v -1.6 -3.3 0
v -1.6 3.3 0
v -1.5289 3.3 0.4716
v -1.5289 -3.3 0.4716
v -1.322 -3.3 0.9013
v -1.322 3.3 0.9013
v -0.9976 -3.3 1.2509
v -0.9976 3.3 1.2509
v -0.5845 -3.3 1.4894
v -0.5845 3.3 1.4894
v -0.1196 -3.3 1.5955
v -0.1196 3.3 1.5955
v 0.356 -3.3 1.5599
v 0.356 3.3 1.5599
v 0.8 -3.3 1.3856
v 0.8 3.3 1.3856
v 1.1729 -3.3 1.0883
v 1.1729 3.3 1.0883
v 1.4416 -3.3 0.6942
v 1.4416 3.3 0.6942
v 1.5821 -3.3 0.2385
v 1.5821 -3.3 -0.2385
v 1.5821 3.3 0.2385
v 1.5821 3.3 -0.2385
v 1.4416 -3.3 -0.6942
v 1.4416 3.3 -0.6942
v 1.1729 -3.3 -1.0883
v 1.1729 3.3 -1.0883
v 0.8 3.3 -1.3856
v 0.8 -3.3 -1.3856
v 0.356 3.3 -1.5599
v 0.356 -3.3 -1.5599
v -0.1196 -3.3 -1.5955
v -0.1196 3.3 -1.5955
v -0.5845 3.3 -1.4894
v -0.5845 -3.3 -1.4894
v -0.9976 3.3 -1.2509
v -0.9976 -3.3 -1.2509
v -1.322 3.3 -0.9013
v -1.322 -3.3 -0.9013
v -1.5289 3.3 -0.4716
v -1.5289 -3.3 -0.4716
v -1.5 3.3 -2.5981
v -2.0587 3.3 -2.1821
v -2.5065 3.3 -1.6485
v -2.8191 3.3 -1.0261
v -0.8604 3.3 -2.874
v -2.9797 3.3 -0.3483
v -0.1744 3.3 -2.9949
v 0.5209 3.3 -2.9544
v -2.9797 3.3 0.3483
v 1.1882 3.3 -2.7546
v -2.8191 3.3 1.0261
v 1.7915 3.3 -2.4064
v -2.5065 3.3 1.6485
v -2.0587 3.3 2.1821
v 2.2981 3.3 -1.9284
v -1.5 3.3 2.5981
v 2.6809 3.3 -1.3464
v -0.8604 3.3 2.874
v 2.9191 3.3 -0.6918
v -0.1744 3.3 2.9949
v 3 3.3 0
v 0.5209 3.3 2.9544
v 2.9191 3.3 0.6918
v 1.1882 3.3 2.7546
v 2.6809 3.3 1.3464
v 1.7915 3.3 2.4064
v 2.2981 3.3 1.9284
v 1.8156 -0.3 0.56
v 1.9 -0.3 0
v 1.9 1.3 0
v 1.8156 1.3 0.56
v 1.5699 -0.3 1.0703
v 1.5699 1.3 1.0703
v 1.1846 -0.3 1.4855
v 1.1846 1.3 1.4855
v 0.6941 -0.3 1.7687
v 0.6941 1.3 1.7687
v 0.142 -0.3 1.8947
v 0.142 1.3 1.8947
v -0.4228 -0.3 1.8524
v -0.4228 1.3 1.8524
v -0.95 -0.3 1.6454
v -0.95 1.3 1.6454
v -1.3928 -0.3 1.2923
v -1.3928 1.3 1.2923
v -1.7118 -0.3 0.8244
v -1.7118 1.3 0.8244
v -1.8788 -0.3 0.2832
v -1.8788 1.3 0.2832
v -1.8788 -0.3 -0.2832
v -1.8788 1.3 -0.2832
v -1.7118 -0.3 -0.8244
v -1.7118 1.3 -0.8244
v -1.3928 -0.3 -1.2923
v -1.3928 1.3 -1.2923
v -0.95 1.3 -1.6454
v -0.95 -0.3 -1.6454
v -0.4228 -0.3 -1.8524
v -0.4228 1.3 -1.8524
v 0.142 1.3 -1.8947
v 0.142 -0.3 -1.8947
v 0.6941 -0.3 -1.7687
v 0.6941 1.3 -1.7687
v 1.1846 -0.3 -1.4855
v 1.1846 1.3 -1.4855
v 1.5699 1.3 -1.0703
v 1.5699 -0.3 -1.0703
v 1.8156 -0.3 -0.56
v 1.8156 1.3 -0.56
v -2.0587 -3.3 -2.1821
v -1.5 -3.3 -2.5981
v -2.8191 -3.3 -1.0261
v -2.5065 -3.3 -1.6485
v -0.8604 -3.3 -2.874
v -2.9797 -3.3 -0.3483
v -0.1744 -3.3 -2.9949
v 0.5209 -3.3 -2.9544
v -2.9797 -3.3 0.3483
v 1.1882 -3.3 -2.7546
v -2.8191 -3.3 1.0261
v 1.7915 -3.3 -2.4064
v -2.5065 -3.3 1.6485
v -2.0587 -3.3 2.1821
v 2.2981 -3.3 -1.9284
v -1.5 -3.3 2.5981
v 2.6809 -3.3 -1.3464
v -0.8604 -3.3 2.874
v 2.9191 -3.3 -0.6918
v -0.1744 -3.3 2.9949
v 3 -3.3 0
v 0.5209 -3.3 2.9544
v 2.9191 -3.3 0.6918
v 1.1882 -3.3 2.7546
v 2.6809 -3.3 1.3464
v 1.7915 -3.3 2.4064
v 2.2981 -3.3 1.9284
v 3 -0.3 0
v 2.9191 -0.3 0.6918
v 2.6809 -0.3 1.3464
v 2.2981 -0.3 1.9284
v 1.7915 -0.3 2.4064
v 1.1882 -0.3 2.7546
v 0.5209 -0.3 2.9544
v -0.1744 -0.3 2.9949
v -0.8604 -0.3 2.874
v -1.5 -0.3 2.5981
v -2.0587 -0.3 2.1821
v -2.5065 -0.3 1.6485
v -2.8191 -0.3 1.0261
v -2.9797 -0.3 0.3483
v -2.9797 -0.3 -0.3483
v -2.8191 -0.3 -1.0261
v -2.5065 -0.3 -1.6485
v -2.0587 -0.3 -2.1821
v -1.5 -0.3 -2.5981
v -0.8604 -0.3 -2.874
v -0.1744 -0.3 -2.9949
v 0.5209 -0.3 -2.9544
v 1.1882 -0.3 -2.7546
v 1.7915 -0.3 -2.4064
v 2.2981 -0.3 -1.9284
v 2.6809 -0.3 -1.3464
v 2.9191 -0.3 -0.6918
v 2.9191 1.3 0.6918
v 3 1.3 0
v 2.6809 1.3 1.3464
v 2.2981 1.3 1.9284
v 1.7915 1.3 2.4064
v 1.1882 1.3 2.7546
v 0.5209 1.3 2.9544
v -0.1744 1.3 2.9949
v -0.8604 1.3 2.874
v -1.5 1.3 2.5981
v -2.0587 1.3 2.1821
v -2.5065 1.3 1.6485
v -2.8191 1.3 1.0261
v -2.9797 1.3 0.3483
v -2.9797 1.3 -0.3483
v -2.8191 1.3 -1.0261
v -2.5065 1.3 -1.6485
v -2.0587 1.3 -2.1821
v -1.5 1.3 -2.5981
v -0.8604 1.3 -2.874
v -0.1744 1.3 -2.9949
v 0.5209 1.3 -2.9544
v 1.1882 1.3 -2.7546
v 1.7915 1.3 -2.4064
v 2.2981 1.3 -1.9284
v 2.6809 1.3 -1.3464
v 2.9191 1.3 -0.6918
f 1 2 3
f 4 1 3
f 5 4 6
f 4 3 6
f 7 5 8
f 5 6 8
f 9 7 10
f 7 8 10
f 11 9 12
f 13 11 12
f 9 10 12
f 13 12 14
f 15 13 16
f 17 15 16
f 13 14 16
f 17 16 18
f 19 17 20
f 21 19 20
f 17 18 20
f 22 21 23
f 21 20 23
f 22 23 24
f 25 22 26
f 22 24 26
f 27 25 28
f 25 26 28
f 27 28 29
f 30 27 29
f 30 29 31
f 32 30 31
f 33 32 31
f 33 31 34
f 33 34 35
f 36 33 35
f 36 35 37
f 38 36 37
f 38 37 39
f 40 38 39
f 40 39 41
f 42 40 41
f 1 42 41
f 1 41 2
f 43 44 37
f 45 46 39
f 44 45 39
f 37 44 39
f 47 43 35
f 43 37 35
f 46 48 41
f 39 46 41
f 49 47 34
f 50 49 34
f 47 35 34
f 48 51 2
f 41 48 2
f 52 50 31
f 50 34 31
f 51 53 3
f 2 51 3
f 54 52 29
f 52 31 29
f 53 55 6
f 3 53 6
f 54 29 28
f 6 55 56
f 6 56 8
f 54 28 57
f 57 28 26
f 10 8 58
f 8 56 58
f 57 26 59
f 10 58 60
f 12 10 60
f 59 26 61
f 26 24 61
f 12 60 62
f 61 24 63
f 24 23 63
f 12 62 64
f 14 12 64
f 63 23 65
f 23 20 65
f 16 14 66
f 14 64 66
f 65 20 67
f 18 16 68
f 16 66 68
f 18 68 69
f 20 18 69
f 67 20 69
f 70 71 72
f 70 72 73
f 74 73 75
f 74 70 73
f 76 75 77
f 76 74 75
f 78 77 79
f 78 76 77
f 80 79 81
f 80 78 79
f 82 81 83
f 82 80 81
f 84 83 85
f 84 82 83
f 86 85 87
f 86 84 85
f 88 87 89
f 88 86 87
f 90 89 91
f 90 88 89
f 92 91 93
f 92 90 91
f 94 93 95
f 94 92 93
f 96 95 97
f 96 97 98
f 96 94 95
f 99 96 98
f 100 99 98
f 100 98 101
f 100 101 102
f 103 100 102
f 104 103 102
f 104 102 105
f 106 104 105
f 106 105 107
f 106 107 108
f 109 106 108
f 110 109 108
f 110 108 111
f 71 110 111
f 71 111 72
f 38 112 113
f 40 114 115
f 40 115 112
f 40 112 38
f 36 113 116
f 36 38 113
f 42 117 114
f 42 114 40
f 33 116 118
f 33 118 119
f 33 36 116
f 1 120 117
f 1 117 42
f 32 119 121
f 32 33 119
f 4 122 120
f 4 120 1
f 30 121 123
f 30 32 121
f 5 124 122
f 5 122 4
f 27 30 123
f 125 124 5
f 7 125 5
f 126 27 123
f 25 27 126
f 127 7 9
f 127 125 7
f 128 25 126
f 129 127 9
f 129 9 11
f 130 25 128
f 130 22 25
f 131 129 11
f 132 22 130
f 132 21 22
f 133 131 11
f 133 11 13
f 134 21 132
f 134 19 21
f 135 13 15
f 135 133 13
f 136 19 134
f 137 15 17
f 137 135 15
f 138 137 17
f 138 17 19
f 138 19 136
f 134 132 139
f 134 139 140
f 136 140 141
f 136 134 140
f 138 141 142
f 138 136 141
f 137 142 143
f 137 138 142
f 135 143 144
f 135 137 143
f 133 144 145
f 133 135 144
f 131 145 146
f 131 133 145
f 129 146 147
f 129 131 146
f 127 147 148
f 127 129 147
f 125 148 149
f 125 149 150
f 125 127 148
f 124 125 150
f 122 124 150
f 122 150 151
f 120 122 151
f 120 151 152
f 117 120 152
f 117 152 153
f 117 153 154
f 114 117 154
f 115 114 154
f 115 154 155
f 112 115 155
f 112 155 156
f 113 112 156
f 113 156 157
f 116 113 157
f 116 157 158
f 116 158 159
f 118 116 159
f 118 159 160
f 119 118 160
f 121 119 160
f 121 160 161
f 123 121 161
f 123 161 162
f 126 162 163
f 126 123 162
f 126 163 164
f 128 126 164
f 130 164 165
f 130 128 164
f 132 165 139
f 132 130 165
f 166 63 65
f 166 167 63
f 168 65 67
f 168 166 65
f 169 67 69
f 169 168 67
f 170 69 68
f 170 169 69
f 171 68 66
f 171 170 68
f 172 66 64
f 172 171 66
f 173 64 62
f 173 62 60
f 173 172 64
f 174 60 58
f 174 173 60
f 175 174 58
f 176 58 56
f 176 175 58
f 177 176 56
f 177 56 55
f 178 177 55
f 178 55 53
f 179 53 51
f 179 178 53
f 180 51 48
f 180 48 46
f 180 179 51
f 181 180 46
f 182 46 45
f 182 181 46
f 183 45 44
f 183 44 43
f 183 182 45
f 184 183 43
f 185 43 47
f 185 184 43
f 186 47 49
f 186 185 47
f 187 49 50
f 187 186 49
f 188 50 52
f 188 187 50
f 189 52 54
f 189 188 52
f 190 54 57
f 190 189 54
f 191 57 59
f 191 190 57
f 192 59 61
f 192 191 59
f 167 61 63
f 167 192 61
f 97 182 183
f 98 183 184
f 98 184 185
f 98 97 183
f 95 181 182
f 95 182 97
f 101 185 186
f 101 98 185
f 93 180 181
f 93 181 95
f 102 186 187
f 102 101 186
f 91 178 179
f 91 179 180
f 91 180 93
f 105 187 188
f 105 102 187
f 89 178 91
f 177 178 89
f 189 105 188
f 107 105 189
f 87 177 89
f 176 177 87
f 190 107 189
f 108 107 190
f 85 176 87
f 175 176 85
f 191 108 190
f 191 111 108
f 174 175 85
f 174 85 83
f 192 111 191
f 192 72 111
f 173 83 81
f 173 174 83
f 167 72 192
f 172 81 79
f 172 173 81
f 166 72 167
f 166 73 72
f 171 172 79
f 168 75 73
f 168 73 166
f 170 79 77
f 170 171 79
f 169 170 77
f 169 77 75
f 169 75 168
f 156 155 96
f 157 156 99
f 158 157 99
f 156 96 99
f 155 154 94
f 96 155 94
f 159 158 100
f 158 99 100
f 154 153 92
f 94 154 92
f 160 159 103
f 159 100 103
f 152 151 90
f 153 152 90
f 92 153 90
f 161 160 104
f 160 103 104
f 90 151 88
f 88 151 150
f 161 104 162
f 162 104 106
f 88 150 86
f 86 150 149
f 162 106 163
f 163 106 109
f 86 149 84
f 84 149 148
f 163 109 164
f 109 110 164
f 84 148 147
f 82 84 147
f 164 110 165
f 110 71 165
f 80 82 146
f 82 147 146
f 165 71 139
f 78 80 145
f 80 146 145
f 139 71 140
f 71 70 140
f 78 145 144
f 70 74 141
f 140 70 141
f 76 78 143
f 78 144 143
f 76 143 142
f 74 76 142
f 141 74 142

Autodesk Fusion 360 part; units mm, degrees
sketch "Sketch1" plane through (0, 0, 0) normal (0, 0, 1) x (1, 0, 0)
  line L0 (0, 3.3) -> (0, -3.3)
  line L1 (0, 3.3) -> (3, 3.3)
  line L2 (3, 3.3) -> (3, 1.3)
  line L3 (3, 1.3) -> (1.9, 1.3)
  line L4 (1.9, 1.3) -> (1.9, -0.3)
  line L5 (1.9, -0.3) -> (3, -0.3)
  line L6 (3, -0.3) -> (3, -3.3)
  line L7 (0, -3.3) -> (3, -3.3)
  dimension "d2" = 6.6
  dimension "d3" = 3.3
  dimension "d4" = 3
  dimension "d5" = 3
  dimension "d6" = 1.6
  dimension "d7" = 1.9
revolve "Revolve1" add sketch "Sketch1" angle 360 about axis through (0, 3.3, 0) along (0, -1, 0)
sketch "Sketch2" plane through (0, 3.3, 0) normal (0, 1, 0) x (-1, 0, 0)
  circle A0 centre (0, 0) radius 3
  circle A1 centre (0, 0) radius 1.6
  dimension "d9" = 3.2
extrude "Extrude1" cut sketch "Sketch2" against normal through all contours A1
equation "d3 = d2 / 2"
equation "d7 = ( 3.8 / 2 ) * 1 mm"
